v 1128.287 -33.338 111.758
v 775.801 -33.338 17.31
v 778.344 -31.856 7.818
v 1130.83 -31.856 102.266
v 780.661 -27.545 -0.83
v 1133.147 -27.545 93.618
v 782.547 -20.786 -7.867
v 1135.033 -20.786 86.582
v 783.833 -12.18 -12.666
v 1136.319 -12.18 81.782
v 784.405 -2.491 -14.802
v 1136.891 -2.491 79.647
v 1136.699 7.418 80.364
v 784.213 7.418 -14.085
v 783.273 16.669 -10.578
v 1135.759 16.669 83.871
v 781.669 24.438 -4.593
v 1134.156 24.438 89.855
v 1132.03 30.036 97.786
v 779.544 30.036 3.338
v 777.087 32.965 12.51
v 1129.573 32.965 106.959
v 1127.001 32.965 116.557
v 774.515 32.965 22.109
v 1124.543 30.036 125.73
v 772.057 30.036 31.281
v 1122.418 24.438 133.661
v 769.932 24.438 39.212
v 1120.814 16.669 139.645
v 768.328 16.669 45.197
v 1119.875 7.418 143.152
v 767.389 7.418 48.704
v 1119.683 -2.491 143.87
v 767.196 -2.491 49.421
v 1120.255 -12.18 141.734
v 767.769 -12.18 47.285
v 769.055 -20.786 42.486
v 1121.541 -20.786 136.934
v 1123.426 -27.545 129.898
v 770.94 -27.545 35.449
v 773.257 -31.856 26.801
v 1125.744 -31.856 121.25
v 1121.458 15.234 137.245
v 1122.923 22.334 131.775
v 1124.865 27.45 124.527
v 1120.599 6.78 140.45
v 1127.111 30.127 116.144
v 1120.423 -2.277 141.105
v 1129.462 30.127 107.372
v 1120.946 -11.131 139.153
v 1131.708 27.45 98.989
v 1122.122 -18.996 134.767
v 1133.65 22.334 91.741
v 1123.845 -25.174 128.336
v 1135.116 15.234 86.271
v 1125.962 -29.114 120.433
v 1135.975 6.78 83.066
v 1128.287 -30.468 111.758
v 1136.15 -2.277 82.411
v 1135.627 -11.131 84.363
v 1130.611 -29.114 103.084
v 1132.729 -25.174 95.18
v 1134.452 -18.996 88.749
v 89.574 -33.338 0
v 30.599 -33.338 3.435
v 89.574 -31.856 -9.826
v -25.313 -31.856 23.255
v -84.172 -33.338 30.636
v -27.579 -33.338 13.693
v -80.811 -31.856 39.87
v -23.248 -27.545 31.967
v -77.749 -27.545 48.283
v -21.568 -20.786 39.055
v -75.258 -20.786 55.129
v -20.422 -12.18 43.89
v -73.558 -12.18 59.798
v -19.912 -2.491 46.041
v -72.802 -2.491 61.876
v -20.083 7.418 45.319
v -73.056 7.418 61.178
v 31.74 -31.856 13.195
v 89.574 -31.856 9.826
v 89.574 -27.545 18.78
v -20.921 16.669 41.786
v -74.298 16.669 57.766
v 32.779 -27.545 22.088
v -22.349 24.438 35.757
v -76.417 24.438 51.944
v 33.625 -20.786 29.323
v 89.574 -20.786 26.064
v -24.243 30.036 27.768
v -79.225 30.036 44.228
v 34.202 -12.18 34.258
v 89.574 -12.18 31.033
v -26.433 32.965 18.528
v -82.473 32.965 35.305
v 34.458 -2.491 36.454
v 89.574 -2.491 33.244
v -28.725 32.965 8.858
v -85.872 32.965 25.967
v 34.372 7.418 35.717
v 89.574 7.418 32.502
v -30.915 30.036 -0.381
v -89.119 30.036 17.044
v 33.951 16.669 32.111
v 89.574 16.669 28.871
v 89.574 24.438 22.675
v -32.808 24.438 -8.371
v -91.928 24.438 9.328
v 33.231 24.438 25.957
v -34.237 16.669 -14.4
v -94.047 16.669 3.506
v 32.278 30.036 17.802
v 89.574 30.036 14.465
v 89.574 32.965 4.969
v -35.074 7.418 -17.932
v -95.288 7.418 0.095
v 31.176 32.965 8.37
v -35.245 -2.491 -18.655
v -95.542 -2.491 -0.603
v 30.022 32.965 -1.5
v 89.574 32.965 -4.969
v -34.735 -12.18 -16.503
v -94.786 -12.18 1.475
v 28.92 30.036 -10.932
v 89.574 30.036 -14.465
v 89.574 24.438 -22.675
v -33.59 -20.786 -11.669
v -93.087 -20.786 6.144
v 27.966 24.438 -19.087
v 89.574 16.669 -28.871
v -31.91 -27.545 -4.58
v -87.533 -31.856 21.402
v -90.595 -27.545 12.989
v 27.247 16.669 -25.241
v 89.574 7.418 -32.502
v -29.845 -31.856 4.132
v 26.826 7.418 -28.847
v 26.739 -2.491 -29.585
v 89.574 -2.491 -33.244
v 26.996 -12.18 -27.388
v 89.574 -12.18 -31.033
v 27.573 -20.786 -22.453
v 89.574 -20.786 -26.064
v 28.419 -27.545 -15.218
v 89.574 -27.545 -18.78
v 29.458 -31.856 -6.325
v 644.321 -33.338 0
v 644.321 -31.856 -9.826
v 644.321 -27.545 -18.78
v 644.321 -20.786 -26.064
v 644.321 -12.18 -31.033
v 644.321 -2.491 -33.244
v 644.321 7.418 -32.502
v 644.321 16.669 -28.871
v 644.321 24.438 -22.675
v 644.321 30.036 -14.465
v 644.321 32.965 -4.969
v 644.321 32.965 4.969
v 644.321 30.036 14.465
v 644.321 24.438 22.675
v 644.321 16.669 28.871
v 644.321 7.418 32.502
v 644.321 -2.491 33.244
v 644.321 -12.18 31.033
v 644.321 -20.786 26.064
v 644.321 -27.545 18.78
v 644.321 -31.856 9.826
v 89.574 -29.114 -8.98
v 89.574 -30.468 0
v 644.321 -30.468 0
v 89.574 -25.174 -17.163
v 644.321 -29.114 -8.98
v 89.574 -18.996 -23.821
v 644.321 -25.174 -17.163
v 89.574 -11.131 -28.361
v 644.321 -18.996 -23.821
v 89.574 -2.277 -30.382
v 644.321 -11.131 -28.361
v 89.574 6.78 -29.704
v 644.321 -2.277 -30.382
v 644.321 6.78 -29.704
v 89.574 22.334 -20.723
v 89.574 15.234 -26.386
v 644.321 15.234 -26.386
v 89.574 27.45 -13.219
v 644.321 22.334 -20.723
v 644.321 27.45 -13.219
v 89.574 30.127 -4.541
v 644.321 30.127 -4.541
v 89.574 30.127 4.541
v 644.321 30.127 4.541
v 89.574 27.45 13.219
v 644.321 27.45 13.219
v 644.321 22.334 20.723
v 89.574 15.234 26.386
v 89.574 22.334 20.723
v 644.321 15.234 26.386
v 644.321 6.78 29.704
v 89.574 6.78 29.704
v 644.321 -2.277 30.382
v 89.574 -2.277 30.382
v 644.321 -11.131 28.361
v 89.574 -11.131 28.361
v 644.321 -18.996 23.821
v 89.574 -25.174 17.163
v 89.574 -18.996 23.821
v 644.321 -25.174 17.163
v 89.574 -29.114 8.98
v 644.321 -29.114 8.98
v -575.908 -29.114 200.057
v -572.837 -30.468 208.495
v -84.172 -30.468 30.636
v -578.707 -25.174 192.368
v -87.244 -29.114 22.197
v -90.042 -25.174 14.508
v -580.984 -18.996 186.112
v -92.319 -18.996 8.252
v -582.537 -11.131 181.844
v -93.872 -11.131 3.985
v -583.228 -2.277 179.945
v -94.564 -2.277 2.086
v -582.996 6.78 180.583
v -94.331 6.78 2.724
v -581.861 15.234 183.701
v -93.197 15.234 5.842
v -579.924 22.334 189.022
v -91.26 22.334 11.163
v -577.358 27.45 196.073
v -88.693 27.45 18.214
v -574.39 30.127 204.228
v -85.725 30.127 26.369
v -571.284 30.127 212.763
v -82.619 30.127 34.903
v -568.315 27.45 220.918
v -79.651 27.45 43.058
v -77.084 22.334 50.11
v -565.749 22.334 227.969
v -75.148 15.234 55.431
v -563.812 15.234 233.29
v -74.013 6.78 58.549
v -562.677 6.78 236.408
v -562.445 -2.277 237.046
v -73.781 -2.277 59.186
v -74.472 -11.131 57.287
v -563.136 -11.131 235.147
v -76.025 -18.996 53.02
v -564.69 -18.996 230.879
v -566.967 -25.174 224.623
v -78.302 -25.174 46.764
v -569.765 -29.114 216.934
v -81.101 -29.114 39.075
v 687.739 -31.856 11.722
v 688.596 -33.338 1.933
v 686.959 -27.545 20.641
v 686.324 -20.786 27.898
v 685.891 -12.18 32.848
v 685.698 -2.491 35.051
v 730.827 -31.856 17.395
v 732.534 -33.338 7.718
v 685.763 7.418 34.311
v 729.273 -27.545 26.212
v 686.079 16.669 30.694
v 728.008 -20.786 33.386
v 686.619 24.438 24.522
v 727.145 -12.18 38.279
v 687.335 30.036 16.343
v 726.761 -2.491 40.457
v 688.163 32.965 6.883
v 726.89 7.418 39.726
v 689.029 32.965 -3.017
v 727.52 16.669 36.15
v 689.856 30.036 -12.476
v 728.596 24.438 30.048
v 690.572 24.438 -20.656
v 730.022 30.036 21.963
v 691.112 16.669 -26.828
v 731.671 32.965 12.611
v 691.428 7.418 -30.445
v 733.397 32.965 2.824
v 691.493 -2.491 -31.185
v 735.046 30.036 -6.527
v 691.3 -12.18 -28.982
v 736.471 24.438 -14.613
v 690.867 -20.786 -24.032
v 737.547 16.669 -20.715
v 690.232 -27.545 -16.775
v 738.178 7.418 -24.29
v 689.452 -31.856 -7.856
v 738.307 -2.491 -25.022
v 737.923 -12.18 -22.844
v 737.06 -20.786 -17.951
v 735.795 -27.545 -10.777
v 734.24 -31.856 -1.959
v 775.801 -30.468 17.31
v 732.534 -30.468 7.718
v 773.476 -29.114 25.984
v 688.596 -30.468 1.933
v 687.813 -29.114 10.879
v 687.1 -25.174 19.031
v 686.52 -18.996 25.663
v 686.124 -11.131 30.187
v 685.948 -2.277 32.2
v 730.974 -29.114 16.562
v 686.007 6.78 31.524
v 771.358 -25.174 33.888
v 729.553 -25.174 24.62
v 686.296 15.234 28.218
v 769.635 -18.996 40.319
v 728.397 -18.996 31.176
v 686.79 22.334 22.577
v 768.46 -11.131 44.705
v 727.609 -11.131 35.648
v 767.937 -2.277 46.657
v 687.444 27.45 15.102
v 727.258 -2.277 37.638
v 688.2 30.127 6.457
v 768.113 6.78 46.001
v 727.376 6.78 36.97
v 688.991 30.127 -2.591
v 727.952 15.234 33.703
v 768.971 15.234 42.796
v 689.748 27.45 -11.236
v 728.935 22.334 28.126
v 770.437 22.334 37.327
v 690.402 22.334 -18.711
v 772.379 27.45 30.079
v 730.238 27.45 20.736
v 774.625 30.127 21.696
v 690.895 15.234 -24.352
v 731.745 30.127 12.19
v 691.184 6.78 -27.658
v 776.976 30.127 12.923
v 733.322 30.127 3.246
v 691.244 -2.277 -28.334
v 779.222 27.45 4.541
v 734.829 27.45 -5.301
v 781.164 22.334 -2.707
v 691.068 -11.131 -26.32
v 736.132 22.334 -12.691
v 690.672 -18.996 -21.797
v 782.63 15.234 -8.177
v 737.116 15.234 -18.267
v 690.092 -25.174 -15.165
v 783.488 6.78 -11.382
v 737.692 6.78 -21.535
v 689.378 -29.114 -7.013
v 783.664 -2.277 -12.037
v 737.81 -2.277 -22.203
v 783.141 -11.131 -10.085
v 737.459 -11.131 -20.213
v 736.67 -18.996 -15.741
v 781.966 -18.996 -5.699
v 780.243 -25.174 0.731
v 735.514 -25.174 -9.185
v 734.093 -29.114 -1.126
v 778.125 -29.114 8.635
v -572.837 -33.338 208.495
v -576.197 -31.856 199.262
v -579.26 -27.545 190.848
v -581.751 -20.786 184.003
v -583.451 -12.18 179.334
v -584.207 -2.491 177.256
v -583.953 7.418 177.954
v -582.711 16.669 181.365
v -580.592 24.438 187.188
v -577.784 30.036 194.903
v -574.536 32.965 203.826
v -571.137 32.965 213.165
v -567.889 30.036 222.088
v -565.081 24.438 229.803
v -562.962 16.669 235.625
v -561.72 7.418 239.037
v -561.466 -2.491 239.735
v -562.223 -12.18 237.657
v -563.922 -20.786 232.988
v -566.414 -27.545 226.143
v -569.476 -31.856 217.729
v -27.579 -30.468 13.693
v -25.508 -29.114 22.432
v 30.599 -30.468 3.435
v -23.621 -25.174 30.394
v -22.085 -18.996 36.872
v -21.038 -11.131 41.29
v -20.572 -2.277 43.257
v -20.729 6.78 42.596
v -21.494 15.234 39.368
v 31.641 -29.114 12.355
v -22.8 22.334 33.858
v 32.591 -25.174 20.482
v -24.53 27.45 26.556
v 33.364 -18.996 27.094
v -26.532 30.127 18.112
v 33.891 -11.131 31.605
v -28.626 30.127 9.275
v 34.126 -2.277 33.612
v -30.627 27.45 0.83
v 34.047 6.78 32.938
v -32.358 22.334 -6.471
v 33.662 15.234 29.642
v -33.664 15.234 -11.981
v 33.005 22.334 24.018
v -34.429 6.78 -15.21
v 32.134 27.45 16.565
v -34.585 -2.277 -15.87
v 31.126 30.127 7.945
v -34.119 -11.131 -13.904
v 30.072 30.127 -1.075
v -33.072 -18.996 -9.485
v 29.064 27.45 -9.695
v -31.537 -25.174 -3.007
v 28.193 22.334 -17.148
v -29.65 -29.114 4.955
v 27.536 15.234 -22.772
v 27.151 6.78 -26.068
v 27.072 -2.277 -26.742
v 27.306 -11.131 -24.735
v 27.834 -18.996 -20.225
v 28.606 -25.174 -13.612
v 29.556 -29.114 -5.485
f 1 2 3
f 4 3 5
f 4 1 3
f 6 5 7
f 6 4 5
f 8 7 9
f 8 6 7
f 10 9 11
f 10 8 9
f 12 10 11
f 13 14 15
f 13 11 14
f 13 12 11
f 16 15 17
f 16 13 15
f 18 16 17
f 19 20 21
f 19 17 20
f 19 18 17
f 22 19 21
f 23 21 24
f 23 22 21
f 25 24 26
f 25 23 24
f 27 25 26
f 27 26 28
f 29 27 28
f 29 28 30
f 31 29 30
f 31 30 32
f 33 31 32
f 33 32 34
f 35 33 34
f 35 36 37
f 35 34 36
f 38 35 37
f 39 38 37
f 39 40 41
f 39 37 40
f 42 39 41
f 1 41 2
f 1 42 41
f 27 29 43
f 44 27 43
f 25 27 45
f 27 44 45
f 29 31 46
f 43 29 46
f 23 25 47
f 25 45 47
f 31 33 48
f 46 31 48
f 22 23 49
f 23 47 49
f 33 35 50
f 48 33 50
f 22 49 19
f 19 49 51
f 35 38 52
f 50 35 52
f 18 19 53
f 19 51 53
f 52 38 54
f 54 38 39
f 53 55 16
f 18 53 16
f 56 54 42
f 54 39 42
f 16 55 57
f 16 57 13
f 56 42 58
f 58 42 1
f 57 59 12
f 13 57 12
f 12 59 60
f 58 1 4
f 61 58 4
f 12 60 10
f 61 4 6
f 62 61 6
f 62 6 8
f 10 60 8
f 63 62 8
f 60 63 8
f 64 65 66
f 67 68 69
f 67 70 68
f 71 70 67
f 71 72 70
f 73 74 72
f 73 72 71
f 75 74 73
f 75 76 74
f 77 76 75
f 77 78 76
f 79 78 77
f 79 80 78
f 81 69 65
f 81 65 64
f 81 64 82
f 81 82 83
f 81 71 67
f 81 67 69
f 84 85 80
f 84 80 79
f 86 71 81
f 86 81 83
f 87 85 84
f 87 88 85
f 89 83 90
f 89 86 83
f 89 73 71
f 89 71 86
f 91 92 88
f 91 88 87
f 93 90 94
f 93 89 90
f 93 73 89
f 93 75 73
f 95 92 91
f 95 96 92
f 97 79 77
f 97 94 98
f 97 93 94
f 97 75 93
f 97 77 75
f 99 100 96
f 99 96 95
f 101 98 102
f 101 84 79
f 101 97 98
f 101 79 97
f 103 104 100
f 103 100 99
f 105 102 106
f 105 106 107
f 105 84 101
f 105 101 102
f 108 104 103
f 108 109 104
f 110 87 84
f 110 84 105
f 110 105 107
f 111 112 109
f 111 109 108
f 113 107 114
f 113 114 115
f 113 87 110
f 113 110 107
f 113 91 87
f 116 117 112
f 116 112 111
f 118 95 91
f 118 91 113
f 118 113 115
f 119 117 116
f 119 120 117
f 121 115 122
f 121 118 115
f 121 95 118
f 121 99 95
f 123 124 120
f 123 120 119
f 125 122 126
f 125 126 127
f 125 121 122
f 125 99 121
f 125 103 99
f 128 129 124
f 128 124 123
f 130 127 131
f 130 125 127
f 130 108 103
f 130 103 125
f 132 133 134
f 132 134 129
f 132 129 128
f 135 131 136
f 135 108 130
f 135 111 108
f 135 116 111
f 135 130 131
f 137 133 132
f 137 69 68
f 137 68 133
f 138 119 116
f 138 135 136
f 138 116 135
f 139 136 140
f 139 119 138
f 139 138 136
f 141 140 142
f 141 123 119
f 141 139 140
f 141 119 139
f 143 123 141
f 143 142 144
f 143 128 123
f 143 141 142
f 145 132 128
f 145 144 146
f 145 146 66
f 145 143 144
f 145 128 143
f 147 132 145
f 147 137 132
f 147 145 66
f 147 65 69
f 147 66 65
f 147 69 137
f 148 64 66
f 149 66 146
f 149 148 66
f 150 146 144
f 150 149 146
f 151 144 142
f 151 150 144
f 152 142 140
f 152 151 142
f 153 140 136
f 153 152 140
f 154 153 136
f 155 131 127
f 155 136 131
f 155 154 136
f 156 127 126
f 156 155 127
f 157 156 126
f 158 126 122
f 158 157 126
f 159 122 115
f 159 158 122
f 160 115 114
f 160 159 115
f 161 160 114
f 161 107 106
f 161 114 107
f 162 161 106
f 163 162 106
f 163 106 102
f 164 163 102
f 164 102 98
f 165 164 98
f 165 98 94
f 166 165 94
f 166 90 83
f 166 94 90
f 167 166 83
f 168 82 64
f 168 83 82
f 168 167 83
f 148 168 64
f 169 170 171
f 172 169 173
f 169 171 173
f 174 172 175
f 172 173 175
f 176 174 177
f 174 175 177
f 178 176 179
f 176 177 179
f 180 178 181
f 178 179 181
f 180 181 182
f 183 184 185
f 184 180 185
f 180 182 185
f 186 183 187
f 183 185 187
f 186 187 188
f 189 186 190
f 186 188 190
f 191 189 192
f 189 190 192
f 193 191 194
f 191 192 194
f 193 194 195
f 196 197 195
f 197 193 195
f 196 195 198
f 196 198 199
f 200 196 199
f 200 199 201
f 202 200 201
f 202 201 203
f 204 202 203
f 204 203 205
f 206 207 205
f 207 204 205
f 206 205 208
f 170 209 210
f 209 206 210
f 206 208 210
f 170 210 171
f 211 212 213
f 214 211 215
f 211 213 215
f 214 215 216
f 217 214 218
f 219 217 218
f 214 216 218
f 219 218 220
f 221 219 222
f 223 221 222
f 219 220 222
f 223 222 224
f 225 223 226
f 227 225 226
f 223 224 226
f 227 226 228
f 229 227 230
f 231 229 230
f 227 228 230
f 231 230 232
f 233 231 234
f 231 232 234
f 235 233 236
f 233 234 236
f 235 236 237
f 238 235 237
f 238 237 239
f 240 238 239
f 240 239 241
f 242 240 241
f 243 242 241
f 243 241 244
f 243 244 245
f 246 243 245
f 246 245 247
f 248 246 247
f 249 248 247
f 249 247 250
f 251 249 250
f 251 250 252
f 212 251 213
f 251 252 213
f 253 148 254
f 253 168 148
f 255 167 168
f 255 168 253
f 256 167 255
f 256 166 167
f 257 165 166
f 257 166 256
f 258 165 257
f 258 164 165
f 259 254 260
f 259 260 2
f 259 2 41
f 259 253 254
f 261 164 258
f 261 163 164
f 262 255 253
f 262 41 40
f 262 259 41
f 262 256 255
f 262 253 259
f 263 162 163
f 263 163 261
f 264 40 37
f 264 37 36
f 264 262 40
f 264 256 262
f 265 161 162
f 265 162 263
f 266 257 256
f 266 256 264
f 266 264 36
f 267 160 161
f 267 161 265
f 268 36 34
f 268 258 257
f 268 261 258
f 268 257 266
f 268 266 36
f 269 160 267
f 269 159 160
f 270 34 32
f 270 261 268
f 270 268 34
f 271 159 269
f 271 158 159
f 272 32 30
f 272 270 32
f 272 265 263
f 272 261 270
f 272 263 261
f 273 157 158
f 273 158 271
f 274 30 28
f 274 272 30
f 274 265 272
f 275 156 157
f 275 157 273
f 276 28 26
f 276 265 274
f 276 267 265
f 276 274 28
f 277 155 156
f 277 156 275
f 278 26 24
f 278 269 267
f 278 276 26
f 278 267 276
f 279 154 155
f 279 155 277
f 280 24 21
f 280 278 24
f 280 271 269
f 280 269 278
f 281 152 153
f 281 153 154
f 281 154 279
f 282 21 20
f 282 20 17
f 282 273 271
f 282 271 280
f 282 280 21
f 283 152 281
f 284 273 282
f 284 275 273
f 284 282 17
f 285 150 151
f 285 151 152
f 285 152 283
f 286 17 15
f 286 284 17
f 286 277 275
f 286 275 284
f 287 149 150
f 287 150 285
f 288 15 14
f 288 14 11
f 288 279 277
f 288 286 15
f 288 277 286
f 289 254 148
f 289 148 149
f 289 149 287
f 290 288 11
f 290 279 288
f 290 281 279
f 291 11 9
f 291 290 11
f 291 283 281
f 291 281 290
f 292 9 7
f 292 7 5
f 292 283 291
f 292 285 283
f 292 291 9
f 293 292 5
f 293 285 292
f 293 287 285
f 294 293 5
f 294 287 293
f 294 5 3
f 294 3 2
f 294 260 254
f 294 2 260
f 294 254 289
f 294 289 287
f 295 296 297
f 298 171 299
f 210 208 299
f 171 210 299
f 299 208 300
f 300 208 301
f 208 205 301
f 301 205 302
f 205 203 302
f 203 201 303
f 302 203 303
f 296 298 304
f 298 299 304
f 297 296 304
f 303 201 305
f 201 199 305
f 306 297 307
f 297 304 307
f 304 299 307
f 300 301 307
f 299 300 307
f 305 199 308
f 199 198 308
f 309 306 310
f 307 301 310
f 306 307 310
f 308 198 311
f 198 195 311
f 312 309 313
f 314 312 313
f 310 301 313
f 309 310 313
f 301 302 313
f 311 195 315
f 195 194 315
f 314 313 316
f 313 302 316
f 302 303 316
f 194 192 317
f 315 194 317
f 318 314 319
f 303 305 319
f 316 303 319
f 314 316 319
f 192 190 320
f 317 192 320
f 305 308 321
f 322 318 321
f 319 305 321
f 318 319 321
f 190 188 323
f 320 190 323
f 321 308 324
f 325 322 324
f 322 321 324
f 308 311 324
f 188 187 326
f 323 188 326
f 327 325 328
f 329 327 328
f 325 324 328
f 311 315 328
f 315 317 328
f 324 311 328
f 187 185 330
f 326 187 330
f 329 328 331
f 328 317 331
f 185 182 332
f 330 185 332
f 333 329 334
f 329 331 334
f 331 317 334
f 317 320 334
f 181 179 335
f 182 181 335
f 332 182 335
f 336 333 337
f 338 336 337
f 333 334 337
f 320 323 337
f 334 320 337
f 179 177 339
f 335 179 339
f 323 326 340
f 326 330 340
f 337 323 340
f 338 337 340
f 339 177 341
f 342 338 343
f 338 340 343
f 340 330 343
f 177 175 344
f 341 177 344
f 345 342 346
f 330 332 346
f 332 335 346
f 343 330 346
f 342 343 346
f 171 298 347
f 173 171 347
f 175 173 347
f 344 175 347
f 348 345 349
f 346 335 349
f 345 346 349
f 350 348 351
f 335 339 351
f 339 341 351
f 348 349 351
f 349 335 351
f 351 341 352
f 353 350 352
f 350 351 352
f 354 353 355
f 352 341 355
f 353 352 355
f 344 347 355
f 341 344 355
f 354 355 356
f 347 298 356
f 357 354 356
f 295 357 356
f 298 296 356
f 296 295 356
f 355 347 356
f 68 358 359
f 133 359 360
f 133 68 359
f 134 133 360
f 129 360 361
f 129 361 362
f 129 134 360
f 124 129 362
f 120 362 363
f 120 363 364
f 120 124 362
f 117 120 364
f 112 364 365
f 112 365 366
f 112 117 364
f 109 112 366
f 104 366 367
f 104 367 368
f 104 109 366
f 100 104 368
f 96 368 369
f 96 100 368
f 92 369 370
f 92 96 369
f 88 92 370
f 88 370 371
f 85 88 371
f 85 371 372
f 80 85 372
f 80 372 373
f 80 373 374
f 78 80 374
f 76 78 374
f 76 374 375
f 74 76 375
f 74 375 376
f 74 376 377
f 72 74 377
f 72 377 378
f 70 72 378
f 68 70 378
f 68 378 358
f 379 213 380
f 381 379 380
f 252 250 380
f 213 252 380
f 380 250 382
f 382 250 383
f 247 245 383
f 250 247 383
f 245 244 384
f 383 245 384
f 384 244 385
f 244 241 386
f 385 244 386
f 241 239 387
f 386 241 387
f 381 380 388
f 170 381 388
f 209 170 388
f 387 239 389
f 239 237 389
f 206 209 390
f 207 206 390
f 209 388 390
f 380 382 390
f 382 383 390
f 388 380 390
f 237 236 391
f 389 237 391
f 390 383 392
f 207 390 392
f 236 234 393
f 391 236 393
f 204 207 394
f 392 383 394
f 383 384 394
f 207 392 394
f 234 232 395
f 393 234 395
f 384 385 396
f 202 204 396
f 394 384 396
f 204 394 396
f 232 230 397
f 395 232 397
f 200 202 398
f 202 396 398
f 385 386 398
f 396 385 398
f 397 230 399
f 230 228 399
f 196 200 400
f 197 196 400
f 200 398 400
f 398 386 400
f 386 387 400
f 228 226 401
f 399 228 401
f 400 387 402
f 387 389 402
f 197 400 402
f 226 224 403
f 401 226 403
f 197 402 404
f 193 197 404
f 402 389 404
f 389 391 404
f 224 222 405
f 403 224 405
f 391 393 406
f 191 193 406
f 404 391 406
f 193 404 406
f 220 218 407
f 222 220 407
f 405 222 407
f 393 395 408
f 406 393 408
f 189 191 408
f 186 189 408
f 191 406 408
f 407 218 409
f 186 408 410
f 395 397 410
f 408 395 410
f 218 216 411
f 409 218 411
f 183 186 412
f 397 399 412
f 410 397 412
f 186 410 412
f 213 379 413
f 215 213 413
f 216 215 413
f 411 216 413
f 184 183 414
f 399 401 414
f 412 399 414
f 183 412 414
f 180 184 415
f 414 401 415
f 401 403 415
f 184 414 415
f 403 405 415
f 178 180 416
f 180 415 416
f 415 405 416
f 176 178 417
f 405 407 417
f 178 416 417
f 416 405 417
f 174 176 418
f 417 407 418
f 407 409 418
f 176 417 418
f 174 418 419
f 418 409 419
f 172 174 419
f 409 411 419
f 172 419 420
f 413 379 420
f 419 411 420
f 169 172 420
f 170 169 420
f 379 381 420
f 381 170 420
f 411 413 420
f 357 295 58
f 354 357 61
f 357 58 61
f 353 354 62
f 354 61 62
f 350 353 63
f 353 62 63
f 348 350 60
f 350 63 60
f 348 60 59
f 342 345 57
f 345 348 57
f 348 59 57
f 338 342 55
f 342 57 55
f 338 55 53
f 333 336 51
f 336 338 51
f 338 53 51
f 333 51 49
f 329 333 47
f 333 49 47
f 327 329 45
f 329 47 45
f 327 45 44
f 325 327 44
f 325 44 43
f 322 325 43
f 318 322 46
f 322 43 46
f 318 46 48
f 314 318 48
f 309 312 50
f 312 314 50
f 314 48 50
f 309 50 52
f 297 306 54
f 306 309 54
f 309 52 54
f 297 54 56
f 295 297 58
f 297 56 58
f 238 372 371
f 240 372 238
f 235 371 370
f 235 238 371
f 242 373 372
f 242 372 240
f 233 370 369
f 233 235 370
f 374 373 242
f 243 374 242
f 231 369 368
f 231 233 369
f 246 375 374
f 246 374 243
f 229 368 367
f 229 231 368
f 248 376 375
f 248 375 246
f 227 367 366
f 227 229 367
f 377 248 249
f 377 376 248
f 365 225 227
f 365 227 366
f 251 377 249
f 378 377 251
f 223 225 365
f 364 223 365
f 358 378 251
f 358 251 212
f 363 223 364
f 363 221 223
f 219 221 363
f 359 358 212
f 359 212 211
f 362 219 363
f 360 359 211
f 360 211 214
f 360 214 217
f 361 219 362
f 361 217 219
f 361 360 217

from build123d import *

# Parameters (mm, degrees)
F2_R = 33.3375
F4_T = -2.86990282


with BuildPart() as f3:
    # F3: sweep along a path in F0
    with BuildLine(Plane.XZ) as f3_path:
        Line((-572.8366216311, 208.4954793713), (-84.1721266095, 30.6361486408))
        ThreePointArc((-84.1721266095, 30.6361486408), (1.3608319451, 7.7176614698), (89.5741061999, 0))
        Line((89.5741061999, 0), (644.3205312256, 0))
        ThreePointArc((644.3205312256, 0), (710.6278368734, 4.3460104221), (775.8006061377, 17.3096802452))
        Line((775.8006061377, 17.3096802452), (1128.2867717916, 111.7580636753))
    # F2 (on line) → F3 (sweep)
    with BuildSketch(Plane(origin=(-572.8366216311, 0, 208.4954793713), x_dir=(0, -1, 0), z_dir=(-0.9396926208, 0, 0.3420201433))):
        Circle(F2_R)
    sweep(path=f3_path.line)

    # F4
    f4_openings = [f3.faces().sort_by_distance(p)[0] for p in [
        (-572.836622, 0, 208.495479),
        (1128.286772, 0, 111.758064),
    ]]
    offset(amount=F4_T, openings=f4_openings)


solid = f3.part
